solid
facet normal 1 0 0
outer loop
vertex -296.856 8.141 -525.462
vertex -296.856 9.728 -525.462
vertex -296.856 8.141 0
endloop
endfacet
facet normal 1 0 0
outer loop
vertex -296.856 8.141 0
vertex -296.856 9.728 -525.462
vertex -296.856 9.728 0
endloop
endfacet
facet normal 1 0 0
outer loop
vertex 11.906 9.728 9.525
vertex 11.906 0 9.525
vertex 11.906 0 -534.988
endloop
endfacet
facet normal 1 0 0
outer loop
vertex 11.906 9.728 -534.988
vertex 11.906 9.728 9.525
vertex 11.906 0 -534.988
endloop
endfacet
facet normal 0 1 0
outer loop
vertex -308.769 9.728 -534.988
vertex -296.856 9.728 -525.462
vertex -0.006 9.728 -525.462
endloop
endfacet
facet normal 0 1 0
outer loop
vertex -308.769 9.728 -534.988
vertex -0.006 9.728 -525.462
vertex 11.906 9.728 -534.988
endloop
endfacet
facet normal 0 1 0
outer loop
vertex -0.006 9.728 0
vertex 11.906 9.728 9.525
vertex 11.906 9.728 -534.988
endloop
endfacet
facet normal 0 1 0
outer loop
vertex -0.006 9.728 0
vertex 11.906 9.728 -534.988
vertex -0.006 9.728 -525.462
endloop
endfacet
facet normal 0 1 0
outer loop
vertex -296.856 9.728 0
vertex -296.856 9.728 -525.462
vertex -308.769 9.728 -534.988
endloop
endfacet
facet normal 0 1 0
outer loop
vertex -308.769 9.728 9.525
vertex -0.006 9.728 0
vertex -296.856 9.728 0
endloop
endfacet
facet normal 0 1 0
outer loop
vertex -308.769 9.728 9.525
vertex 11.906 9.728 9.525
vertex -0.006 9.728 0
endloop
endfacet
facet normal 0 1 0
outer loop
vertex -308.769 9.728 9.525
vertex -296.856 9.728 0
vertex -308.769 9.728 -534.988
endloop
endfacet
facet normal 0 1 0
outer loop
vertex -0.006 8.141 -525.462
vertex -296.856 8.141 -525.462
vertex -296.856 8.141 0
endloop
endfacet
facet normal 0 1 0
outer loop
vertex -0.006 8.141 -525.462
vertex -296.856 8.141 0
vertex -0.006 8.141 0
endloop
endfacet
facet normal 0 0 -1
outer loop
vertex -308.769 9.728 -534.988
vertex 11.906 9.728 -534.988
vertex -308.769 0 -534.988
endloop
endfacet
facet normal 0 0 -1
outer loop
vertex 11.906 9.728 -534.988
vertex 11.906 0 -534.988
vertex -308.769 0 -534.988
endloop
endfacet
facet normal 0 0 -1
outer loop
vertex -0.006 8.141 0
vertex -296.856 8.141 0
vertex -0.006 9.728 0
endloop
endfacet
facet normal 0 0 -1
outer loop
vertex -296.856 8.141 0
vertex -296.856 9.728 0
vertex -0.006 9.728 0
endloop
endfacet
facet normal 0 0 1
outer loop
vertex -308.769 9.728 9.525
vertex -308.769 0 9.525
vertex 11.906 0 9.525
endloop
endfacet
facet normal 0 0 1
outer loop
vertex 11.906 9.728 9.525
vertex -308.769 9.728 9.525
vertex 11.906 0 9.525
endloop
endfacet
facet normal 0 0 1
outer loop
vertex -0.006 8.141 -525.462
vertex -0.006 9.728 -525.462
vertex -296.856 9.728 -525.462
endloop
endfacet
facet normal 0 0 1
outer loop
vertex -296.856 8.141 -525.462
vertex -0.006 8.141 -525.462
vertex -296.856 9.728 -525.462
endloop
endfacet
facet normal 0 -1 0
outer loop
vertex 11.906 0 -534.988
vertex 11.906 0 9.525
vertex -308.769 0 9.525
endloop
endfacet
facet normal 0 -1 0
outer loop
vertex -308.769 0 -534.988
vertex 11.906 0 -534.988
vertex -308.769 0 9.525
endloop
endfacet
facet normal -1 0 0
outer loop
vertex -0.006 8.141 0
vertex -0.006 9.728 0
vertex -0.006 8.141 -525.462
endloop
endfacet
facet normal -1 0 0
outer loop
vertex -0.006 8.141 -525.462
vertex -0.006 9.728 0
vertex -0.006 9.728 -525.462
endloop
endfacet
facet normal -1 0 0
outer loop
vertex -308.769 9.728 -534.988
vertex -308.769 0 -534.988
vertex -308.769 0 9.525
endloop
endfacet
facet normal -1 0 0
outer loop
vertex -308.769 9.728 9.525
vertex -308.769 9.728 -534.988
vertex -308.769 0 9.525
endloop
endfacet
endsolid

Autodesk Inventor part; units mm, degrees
ref_plane "YZ Plane" through (0, 0, 0) normal (1, 0, 0) x (0, 1, 0)
ref_plane "XZ Plane" through (0, 0, 0) normal (0, 1, 0) x (-1, 0, 0)
ref_plane "XY Plane" through (0, 0, 0) normal (0, 0, 1) x (1, 0, 0)
sketch "Sketch1" plane through (0, 0, 0) normal (0, 1, 0) x (-1, 0, 0)
  line L0 (0, 0) -> (296.8625, 0)
  line L1 (296.8625, 0) -> (296.8625, -525.4625)
  line L2 (296.8625, -525.4625) -> (0, -525.4625)
  line L3 (0, -525.4625) -> (0, 0)
  line L4 (308.7687, 9.525) -> (-11.9063, 9.525)
  line L5 (-11.9063, 9.525) -> (-11.9062, -534.9875)
  line L6 (-11.9062, -534.9875) -> (308.7688, -534.9875)
  line L7 (308.7688, -534.9875) -> (308.7687, 9.525)
  dimension "d0" = 296.8625
  dimension "d1" = 525.4625
  dimension "d4" = 11.9062
  dimension "d5" = 11.9062
  dimension "d6" = 9.525
  dimension "d7" = 9.525
extrude "Extrusion1" add sketch "Sketch1" along normal blind 9.7282 contours L0 L1 L2 L3 | L7 L6 L5 L4
sketch "Sketch2" plane through (0, 9.7282, 0) normal (0, 1, 0) x (1, 0, 0)
  line L0 (-296.8562, 0) -> (-0.0063, 0)
  line L1 (-0.0063, 0) -> (-0.0064, 525.4625)
  line L2 (-0.0064, 525.4625) -> (-296.8562, 525.4625)
  line L3 (-296.8562, 525.4625) -> (-296.8562, 0)
  line L4 (-308.7688, 534.9875) -> (-308.7687, -9.525) projected
  line L5 (-308.7687, -9.525) -> (11.9063, -9.525) projected
  line L6 (11.9062, 534.9875) -> (-308.7688, 534.9875) projected
  line L7 (11.9063, -9.525) -> (11.9062, 534.9875) projected
  point P0 (0, 0)
  dimension "d10" = 11.9126
  dimension "d11" = 9.525
  dimension "d12" = 9.525
  dimension "d13" = 11.9126
extrude "Extrusion2" cut sketch "Sketch2" against normal blind 1.5875 contours L3 L2 L1 L0
properties part number "LCD Screen"
